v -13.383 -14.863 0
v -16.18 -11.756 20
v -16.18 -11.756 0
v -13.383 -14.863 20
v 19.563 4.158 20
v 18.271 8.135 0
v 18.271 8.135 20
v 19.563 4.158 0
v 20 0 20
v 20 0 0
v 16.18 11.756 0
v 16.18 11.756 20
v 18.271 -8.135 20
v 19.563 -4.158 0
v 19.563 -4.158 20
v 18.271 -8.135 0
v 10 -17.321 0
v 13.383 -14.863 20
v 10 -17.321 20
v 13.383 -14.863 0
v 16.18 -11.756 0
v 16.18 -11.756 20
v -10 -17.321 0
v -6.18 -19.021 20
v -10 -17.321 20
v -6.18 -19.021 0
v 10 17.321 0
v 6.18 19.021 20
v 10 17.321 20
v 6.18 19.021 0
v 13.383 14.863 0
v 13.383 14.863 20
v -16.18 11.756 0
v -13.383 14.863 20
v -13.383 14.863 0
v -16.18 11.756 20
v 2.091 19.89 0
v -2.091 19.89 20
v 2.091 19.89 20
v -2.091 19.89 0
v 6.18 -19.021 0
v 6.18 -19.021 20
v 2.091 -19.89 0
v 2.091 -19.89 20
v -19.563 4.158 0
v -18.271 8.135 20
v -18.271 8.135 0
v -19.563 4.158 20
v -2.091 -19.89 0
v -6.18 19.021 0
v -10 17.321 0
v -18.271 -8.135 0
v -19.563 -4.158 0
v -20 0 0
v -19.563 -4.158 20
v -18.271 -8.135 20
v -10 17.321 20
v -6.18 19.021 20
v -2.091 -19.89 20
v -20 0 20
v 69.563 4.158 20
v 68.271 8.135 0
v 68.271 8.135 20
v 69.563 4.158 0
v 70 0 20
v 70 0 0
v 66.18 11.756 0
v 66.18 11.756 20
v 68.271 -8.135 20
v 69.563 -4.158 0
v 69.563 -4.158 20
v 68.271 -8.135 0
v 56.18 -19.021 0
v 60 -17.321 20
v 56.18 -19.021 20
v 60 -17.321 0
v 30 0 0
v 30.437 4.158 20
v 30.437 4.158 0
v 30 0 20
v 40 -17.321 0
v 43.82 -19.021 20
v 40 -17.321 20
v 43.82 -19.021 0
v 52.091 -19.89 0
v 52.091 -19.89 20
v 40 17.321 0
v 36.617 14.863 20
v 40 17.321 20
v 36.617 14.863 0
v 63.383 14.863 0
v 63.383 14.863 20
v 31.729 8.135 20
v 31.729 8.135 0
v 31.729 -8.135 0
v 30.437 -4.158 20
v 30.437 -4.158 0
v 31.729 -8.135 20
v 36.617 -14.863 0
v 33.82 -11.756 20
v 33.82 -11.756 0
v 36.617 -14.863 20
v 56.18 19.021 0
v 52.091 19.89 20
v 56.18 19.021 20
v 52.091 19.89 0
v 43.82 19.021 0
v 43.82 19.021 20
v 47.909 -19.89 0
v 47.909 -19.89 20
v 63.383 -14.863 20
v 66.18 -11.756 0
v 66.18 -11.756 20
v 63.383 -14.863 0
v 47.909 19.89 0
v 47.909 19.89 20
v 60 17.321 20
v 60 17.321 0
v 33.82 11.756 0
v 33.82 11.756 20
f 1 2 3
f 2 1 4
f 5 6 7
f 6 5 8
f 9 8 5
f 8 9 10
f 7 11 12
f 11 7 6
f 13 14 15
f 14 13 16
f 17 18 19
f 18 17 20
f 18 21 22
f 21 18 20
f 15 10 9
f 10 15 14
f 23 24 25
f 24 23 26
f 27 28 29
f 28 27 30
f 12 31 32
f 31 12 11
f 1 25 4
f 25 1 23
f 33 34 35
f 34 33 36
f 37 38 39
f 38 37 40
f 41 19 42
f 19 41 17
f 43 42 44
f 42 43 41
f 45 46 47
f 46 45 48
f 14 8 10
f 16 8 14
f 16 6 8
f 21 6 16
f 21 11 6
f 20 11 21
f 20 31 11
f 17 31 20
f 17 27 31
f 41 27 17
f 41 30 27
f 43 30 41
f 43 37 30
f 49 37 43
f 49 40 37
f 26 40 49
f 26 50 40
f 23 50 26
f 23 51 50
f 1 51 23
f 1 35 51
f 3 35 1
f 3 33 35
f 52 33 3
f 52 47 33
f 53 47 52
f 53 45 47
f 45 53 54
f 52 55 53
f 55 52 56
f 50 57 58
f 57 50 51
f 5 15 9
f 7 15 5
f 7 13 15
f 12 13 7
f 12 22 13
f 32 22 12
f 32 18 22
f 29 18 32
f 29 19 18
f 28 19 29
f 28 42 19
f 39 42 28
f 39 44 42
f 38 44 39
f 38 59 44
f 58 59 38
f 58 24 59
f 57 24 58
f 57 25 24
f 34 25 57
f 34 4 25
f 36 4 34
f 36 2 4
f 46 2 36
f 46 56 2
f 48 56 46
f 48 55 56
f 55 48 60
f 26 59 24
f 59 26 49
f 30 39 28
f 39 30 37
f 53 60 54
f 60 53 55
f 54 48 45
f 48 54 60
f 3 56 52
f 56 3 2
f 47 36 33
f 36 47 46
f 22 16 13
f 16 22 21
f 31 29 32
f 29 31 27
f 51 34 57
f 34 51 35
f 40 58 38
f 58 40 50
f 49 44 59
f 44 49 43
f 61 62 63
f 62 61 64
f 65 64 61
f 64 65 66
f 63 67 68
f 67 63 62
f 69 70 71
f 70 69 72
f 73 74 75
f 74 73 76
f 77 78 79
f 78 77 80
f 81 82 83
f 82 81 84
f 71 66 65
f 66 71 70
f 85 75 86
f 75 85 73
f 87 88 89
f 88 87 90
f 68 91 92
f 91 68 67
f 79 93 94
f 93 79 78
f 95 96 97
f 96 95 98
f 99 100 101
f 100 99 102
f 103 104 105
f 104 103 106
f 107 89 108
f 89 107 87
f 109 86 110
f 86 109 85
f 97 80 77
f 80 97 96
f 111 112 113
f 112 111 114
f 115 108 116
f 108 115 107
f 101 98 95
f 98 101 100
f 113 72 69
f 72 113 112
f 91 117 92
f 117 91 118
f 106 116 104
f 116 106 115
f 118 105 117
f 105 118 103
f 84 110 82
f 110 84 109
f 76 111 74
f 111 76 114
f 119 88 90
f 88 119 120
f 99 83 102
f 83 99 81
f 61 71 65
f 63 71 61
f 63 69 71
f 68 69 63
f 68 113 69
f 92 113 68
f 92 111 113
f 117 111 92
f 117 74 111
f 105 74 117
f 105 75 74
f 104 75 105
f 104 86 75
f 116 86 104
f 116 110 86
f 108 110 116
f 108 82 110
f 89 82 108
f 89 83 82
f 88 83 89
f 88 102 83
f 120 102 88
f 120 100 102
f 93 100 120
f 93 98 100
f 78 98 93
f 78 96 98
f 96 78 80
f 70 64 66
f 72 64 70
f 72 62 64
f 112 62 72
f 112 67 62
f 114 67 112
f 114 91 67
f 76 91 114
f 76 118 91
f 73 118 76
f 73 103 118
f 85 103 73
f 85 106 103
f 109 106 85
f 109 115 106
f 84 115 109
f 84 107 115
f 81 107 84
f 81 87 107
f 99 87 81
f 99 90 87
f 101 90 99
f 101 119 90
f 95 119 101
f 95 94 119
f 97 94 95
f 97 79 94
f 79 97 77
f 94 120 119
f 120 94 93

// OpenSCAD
x=10;

cylinder(h=20,r=x);

x=20;

translate ([50,0,0])cylinder(h=20,r=x);
